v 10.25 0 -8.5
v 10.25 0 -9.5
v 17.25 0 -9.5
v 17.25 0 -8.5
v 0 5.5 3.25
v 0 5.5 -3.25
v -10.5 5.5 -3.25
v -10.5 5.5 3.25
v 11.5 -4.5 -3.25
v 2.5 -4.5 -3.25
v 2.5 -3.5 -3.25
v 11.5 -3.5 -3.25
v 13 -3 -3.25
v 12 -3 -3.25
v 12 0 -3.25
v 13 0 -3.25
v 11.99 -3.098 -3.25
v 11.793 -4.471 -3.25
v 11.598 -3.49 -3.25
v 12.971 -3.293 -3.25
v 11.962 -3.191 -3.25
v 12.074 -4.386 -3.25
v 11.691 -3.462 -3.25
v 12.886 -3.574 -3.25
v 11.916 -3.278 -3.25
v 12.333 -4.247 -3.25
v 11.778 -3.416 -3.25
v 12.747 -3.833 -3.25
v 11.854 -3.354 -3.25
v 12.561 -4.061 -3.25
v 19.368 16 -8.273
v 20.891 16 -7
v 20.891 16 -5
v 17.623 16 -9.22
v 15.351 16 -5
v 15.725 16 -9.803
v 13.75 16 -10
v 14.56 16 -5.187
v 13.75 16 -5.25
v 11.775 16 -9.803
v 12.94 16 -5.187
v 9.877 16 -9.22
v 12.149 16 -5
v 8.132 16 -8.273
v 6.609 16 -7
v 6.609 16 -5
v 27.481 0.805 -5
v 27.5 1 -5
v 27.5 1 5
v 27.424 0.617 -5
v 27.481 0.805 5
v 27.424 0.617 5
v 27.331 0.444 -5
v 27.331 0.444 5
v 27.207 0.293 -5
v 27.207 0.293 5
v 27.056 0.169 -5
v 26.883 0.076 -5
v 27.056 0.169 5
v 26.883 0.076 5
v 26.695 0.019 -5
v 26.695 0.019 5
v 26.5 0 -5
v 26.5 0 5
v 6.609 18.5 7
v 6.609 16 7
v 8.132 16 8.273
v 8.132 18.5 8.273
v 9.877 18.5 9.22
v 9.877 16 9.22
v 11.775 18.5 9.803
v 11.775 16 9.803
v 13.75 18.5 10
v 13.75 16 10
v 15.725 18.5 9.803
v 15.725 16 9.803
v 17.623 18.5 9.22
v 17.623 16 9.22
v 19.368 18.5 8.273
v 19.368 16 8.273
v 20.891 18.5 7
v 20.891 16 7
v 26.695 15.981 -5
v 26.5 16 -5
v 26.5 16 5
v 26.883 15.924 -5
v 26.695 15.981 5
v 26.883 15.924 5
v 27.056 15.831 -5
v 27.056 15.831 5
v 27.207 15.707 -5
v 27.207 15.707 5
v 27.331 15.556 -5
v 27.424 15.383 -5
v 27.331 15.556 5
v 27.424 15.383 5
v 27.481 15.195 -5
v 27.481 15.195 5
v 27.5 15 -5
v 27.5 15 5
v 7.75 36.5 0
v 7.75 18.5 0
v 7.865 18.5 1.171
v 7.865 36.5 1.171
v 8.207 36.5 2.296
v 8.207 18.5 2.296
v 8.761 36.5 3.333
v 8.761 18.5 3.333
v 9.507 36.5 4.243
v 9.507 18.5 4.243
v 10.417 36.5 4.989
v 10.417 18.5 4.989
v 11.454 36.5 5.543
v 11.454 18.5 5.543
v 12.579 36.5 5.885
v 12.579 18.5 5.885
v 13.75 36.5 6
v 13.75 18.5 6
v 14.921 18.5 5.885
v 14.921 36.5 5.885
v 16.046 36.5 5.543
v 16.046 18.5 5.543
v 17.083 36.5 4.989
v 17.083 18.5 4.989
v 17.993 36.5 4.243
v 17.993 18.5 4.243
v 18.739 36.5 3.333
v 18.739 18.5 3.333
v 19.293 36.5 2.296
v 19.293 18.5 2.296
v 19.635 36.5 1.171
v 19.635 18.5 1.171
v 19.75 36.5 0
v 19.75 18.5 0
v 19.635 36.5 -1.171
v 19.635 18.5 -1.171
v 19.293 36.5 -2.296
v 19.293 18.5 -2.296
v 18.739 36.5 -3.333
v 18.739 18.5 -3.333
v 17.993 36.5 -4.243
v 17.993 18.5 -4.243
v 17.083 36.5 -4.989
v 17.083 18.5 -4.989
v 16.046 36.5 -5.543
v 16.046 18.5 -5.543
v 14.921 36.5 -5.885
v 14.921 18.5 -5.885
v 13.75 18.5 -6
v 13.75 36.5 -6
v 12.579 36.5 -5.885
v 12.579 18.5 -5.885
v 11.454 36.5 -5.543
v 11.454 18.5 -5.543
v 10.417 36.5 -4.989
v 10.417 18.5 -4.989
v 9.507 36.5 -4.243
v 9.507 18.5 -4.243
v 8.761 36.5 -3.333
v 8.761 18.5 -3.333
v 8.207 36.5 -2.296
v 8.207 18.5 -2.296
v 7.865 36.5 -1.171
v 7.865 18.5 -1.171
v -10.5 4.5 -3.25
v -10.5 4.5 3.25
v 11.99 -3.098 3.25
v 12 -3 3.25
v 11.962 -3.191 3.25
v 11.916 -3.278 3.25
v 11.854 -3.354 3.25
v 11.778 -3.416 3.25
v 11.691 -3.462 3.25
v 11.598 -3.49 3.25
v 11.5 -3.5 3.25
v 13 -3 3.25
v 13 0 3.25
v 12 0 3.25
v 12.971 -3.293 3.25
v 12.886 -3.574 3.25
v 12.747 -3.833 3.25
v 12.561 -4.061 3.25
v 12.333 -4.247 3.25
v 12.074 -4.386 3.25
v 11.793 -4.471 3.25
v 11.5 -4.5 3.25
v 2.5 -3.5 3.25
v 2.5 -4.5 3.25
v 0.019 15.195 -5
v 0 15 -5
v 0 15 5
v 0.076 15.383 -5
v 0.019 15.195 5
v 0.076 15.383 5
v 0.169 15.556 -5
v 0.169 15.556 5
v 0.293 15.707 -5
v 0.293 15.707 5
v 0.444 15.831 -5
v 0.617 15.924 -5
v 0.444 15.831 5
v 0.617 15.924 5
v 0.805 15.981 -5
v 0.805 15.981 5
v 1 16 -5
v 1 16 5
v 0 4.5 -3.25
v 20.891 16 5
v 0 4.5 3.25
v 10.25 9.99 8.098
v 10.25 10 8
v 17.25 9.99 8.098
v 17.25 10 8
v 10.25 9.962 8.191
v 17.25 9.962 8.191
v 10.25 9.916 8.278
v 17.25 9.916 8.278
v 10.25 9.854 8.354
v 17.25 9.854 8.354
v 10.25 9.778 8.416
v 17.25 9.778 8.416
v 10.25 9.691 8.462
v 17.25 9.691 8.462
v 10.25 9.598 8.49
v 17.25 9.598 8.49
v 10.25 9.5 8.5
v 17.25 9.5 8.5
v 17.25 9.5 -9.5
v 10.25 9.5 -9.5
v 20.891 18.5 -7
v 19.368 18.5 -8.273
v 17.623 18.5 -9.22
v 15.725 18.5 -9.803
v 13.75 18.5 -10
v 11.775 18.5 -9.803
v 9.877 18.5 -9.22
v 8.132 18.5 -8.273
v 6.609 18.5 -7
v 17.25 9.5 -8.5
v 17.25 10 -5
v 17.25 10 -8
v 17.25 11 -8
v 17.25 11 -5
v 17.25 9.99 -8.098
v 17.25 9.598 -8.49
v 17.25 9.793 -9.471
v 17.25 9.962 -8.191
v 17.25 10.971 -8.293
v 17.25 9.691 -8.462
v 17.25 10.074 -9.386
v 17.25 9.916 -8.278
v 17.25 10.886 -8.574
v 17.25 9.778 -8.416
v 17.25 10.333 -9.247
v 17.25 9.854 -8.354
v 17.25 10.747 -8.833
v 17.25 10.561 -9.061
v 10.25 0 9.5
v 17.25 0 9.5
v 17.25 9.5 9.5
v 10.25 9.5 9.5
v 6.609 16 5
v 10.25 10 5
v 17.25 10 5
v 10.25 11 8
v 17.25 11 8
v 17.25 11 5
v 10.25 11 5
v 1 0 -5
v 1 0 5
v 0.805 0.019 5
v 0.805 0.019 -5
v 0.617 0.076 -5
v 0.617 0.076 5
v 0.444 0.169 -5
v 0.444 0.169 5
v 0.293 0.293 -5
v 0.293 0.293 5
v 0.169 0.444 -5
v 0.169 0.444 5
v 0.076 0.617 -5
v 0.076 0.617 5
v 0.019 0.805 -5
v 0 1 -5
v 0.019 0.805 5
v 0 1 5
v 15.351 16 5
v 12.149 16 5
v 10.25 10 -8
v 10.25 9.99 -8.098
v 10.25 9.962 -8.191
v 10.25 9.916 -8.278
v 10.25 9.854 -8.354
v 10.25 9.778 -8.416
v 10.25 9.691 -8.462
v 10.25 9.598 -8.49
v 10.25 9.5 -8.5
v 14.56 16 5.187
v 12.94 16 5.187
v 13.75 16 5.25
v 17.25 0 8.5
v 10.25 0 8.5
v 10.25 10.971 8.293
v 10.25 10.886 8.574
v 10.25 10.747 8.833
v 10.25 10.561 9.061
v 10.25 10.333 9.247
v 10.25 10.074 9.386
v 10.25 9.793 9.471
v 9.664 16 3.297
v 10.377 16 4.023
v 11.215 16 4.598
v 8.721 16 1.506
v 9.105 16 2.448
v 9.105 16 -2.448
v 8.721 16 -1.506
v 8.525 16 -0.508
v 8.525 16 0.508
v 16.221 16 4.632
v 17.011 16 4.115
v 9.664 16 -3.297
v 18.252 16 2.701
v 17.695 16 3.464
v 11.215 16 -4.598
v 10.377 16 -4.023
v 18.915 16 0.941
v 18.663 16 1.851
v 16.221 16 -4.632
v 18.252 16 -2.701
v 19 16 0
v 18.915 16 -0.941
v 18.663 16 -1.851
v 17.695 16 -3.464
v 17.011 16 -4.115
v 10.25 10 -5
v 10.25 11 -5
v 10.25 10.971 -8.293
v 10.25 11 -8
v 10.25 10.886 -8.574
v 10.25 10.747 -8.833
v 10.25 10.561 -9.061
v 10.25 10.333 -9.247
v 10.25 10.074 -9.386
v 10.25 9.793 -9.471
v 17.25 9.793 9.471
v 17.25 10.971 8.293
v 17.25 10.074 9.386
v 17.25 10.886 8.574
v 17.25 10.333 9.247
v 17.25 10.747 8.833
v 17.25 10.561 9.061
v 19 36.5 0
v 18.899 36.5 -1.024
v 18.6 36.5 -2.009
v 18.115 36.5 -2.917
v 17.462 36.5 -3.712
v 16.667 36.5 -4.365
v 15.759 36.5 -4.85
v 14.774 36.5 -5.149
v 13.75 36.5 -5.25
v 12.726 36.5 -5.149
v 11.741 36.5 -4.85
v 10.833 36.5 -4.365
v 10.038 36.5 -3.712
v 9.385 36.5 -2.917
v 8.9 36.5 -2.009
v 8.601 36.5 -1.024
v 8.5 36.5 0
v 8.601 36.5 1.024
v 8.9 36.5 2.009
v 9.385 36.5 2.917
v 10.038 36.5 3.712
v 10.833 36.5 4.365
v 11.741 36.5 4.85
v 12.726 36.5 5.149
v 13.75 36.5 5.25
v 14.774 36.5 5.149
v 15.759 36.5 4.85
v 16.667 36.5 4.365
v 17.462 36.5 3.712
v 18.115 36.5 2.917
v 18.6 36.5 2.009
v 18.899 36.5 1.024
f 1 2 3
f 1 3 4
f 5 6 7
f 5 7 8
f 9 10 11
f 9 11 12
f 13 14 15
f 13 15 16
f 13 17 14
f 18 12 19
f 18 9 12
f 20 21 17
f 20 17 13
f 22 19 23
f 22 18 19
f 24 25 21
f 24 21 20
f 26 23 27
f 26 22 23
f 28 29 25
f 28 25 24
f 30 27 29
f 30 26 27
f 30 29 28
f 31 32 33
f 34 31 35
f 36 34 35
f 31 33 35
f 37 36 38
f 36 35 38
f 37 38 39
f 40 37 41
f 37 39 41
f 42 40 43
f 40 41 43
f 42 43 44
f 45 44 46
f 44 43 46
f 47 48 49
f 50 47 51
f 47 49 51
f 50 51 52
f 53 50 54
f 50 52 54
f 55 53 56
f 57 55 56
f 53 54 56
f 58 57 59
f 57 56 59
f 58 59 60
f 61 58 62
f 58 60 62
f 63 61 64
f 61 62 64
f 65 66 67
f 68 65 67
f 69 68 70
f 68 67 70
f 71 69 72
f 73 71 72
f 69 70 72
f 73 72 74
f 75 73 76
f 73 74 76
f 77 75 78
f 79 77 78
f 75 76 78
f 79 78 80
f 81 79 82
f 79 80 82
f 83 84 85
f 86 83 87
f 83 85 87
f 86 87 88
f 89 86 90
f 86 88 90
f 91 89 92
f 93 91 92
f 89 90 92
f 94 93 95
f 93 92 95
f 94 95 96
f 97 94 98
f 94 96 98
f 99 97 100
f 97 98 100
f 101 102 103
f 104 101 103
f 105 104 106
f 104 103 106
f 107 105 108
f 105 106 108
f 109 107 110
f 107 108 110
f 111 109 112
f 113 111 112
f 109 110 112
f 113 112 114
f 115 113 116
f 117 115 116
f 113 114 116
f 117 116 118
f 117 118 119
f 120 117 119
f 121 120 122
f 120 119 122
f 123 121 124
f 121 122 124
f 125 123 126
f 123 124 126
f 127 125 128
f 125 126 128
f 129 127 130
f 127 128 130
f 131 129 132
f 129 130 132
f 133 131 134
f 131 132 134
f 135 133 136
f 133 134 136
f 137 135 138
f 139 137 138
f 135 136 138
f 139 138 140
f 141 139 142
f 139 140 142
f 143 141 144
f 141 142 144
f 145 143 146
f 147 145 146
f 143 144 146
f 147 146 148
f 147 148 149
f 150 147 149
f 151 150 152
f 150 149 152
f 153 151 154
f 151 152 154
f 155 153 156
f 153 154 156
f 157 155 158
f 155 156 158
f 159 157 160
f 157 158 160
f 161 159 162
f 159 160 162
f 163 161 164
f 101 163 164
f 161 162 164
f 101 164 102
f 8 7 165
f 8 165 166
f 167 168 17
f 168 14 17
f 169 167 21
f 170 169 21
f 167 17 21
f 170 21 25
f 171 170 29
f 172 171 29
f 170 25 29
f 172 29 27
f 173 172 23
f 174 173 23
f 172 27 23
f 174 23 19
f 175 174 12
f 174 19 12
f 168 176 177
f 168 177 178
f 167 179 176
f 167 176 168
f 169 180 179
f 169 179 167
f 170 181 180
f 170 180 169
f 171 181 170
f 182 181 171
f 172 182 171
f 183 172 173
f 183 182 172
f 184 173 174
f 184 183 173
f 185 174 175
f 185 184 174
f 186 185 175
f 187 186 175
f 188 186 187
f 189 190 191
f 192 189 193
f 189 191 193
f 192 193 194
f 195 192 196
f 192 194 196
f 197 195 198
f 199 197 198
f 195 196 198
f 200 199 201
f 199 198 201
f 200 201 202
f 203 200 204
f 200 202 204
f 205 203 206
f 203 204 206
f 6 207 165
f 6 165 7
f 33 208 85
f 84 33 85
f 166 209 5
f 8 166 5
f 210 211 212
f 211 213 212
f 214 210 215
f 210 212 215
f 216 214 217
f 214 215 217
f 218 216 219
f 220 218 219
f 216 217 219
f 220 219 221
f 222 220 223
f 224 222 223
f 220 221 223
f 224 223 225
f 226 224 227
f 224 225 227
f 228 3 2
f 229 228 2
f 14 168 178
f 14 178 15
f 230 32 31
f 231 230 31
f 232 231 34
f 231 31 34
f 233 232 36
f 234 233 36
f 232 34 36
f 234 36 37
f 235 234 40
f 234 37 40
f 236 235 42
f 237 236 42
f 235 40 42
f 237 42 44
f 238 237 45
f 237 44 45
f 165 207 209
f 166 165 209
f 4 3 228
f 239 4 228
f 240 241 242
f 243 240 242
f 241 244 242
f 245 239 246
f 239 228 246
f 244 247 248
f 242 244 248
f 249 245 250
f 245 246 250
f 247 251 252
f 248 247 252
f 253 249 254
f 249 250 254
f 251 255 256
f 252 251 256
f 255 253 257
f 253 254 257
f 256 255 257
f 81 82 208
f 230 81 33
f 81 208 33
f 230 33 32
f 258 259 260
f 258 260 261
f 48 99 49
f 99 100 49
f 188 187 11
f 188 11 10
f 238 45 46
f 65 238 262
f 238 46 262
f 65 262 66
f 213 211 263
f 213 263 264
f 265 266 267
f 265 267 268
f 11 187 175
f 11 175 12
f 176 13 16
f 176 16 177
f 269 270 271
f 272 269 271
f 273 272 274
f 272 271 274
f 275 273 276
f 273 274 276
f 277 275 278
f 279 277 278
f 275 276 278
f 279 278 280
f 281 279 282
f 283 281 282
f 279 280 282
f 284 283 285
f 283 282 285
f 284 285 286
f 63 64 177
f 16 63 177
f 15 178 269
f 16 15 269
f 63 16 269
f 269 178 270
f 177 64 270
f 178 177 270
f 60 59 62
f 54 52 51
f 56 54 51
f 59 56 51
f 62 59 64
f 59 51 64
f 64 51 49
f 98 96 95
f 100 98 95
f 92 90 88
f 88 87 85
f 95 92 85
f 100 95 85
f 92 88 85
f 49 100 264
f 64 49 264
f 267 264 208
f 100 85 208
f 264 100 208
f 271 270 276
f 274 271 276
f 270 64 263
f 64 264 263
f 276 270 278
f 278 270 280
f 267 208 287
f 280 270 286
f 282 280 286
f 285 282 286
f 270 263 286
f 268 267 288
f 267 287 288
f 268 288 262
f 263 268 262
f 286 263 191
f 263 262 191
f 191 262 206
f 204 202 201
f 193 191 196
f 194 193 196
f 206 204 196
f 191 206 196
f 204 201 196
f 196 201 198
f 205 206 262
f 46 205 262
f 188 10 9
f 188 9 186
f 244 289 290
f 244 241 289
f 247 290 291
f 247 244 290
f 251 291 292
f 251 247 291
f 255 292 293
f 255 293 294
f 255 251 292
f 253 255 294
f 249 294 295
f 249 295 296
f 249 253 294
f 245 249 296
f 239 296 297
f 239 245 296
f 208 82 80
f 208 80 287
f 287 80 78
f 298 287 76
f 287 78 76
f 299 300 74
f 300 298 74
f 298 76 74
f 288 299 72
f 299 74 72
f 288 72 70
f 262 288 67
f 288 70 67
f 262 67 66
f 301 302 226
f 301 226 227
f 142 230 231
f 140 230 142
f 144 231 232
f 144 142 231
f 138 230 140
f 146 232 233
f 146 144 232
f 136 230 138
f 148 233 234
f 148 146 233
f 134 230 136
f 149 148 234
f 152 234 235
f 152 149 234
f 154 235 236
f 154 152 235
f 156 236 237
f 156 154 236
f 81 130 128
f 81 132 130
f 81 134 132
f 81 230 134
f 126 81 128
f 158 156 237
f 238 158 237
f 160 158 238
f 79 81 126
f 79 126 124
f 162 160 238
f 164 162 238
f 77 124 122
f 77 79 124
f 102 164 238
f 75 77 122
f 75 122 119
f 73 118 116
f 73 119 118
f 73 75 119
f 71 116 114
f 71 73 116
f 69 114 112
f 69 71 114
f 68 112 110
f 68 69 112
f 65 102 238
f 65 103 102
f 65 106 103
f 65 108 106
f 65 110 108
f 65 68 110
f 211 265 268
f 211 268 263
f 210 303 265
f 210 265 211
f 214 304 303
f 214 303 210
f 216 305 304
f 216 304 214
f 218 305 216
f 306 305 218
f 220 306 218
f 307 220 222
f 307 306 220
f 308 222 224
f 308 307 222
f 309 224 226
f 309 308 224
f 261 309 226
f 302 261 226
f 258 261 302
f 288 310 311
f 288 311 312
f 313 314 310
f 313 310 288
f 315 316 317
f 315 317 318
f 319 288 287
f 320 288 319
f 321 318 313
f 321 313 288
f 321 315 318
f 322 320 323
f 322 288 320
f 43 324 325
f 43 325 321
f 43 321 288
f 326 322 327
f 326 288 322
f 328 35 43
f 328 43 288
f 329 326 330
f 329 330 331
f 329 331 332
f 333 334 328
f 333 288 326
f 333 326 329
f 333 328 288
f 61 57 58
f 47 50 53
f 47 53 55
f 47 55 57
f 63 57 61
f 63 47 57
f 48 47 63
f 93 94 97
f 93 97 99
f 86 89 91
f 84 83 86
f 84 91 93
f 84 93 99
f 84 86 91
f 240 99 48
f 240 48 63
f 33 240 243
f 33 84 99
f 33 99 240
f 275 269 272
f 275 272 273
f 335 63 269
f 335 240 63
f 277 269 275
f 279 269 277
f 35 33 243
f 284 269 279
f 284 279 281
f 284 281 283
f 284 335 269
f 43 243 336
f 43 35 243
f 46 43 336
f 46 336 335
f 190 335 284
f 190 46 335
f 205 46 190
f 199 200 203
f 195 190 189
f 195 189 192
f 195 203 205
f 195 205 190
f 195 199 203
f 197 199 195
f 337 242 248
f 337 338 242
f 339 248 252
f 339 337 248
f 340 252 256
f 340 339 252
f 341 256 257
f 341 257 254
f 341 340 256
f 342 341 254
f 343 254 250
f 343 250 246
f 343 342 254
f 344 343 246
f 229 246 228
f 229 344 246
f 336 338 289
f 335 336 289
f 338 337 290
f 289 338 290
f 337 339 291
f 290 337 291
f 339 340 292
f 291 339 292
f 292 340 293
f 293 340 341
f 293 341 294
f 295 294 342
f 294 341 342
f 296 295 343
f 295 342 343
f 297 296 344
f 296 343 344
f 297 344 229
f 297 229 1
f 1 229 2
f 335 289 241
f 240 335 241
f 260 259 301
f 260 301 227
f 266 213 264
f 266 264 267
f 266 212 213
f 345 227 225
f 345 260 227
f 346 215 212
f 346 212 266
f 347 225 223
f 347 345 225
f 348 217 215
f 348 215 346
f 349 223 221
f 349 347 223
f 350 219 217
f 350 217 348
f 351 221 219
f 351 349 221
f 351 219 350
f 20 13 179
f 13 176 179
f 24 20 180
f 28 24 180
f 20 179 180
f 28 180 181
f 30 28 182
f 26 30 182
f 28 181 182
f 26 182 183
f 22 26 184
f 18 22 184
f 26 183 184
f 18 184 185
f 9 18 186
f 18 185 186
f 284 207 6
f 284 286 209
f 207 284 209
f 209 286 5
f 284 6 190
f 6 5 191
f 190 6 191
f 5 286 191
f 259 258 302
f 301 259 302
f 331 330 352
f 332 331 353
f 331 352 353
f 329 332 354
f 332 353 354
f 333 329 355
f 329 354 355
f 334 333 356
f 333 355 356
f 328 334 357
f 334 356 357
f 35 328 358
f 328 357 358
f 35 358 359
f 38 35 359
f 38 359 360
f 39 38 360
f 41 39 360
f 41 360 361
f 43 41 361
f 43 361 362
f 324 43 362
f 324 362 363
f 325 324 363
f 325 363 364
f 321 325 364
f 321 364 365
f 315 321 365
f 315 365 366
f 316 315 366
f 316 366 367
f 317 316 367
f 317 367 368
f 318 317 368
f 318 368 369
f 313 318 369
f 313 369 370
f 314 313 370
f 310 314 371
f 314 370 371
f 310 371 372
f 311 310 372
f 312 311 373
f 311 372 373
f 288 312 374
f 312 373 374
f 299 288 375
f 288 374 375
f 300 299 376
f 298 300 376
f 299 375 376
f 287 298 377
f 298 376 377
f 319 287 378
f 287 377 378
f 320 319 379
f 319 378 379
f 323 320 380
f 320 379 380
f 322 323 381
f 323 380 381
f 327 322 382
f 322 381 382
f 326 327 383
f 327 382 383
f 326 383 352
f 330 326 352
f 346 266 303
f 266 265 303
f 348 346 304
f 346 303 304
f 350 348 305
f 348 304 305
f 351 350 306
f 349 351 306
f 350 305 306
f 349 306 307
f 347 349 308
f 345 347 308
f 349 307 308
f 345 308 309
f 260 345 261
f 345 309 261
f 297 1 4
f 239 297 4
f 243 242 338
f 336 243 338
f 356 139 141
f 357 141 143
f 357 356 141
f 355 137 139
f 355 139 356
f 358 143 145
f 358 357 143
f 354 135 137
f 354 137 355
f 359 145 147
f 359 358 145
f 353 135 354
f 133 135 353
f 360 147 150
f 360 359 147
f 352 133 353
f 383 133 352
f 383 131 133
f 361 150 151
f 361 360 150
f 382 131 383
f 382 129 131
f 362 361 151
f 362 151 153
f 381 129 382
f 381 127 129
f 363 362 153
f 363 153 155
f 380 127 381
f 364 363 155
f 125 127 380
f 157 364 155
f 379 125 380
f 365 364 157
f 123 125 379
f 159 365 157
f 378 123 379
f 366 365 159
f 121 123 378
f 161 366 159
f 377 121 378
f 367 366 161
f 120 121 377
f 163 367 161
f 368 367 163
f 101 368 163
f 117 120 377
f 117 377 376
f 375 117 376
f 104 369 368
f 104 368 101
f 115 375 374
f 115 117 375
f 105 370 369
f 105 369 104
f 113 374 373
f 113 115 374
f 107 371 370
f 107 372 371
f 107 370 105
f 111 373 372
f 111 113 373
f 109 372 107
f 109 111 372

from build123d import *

# Parameters (mm, degrees)
BOSS_EXTRUDE1_DEPTH      = 5
BOSS_EXTRUDE1_DEPTH_BACK = 5
BOSS_EXTRUDE2_DEPTH      = 2.5
SKETCH3_W                = 1
SKETCH3_H                = 6.5
SKETCH6_W                = 6.5
SKETCH6_H                = 1
BOSS_EXTRUDE3_DEPTH      = 10.5
SKETCH7_W                = 7
SKETCH7_H                = 1
SKETCH9_R                = 6
BOSS_EXTRUDE4_DEPTH      = 18
SKETCH10_R               = 5.25
CUT_EXTRUDE1_DEPTH       = 20.5


with BuildPart() as part:
    # Sketch1 → Boss-Extrude1 (new body, two sides)
    with BuildSketch(Plane.XY) as boss_extrude1_sk:
        with BuildLine():
            Line((0, 1), (0, 15))
            ThreePointArc((0, 15), (0.292893219, 15.707106781), (1, 16))
            Line((1, 16), (26.5, 16))
            ThreePointArc((26.5, 16), (27.207106781, 15.707106781), (27.5, 15))
            Line((27.5, 15), (27.5, 1))
            ThreePointArc((27.5, 1), (27.207106781, 0.292893219), (26.5, 0))
            Line((26.5, 0), (1, 0))
            ThreePointArc((1, 0), (0.292893219, 0.292893219), (0, 1))
        make_face()
    extrude(amount=BOSS_EXTRUDE1_DEPTH)
    extrude(boss_extrude1_sk.sketch, amount=-BOSS_EXTRUDE1_DEPTH_BACK)

    # Sketch2 → Boss-Extrude2 (add)
    with BuildSketch(Plane(origin=(0, 16, 0), x_dir=(-1, 0, 0), z_dir=(0, 1, 0))):
        with BuildLine():
            Line((-20.891428429, 7), (-20.891428429, -7))
            ThreePointArc((-20.891428429, -7), (-13.75, -10), (-6.608571571, -7))
            Line((-6.608571571, -7), (-6.608571571, 7))
            ThreePointArc((-6.608571571, 7), (-13.75, 10), (-20.891428429, 7))
        make_face()
    extrude(amount=BOSS_EXTRUDE2_DEPTH)

    # Sweep1: sweep along a path in Sketch5
    with BuildLine(Plane.XY.offset(5)) as sweep1_path:
        Line((12, 0), (12, -3))
        ThreePointArc((12, -3), (11.853553391, -3.353553391), (11.5, -3.5))
        Line((11.5, -3.5), (2.5, -3.5))
    # Sketch3 → Sweep1 (sweep)
    with BuildSketch(Plane.XZ):
        with Locations((12.5, 0)):
            Rectangle(SKETCH3_W, SKETCH3_H)
    sweep(path=sweep1_path.line)

    # Sketch6 → Boss-Extrude3 (add)
    with BuildSketch(Plane.ZY):
        with Locations((0, 5)):
            Rectangle(SKETCH6_W, SKETCH6_H)
    extrude(amount=BOSS_EXTRUDE3_DEPTH)

    # Sweep2: sweep along a path in Sketch8
    with BuildLine(Plane.ZY) as sweep2_path:
        Line((5, 10), (8, 10))
        ThreePointArc((8, 10), (8.353553391, 9.853553391), (8.5, 9.5))
        Line((8.5, 9.5), (8.5, 0))
    # Sketch7 → Sweep2 (sweep)
    with BuildSketch(Plane.XY.offset(5)):
        with Locations((13.75, 10.5)):
            Rectangle(SKETCH7_W, SKETCH7_H)
    sweep2 = sweep(path=sweep2_path.line)

    # Mirror1: Sweep2 across plane
    add(sweep2.mirror(Plane.XY))

    # Sketch9 → Boss-Extrude4 (add)
    with BuildSketch(Plane(origin=(0, 18.5, 0), x_dir=(-1, 0, 0), z_dir=(0, 1, 0))):
        with Locations((-13.75, 0)):
            Circle(SKETCH9_R)
    extrude(amount=BOSS_EXTRUDE4_DEPTH)

    # Sketch10 → Cut-Extrude1 (cut)
    with BuildSketch(Plane(origin=(0, 36.5, 0), x_dir=(1, 0, 0), z_dir=(0, 1, 0))):
        with Locations((13.75, 0)):
            Circle(SKETCH10_R)
    extrude(amount=-CUT_EXTRUDE1_DEPTH, mode=Mode.SUBTRACT)


solid = part.part
